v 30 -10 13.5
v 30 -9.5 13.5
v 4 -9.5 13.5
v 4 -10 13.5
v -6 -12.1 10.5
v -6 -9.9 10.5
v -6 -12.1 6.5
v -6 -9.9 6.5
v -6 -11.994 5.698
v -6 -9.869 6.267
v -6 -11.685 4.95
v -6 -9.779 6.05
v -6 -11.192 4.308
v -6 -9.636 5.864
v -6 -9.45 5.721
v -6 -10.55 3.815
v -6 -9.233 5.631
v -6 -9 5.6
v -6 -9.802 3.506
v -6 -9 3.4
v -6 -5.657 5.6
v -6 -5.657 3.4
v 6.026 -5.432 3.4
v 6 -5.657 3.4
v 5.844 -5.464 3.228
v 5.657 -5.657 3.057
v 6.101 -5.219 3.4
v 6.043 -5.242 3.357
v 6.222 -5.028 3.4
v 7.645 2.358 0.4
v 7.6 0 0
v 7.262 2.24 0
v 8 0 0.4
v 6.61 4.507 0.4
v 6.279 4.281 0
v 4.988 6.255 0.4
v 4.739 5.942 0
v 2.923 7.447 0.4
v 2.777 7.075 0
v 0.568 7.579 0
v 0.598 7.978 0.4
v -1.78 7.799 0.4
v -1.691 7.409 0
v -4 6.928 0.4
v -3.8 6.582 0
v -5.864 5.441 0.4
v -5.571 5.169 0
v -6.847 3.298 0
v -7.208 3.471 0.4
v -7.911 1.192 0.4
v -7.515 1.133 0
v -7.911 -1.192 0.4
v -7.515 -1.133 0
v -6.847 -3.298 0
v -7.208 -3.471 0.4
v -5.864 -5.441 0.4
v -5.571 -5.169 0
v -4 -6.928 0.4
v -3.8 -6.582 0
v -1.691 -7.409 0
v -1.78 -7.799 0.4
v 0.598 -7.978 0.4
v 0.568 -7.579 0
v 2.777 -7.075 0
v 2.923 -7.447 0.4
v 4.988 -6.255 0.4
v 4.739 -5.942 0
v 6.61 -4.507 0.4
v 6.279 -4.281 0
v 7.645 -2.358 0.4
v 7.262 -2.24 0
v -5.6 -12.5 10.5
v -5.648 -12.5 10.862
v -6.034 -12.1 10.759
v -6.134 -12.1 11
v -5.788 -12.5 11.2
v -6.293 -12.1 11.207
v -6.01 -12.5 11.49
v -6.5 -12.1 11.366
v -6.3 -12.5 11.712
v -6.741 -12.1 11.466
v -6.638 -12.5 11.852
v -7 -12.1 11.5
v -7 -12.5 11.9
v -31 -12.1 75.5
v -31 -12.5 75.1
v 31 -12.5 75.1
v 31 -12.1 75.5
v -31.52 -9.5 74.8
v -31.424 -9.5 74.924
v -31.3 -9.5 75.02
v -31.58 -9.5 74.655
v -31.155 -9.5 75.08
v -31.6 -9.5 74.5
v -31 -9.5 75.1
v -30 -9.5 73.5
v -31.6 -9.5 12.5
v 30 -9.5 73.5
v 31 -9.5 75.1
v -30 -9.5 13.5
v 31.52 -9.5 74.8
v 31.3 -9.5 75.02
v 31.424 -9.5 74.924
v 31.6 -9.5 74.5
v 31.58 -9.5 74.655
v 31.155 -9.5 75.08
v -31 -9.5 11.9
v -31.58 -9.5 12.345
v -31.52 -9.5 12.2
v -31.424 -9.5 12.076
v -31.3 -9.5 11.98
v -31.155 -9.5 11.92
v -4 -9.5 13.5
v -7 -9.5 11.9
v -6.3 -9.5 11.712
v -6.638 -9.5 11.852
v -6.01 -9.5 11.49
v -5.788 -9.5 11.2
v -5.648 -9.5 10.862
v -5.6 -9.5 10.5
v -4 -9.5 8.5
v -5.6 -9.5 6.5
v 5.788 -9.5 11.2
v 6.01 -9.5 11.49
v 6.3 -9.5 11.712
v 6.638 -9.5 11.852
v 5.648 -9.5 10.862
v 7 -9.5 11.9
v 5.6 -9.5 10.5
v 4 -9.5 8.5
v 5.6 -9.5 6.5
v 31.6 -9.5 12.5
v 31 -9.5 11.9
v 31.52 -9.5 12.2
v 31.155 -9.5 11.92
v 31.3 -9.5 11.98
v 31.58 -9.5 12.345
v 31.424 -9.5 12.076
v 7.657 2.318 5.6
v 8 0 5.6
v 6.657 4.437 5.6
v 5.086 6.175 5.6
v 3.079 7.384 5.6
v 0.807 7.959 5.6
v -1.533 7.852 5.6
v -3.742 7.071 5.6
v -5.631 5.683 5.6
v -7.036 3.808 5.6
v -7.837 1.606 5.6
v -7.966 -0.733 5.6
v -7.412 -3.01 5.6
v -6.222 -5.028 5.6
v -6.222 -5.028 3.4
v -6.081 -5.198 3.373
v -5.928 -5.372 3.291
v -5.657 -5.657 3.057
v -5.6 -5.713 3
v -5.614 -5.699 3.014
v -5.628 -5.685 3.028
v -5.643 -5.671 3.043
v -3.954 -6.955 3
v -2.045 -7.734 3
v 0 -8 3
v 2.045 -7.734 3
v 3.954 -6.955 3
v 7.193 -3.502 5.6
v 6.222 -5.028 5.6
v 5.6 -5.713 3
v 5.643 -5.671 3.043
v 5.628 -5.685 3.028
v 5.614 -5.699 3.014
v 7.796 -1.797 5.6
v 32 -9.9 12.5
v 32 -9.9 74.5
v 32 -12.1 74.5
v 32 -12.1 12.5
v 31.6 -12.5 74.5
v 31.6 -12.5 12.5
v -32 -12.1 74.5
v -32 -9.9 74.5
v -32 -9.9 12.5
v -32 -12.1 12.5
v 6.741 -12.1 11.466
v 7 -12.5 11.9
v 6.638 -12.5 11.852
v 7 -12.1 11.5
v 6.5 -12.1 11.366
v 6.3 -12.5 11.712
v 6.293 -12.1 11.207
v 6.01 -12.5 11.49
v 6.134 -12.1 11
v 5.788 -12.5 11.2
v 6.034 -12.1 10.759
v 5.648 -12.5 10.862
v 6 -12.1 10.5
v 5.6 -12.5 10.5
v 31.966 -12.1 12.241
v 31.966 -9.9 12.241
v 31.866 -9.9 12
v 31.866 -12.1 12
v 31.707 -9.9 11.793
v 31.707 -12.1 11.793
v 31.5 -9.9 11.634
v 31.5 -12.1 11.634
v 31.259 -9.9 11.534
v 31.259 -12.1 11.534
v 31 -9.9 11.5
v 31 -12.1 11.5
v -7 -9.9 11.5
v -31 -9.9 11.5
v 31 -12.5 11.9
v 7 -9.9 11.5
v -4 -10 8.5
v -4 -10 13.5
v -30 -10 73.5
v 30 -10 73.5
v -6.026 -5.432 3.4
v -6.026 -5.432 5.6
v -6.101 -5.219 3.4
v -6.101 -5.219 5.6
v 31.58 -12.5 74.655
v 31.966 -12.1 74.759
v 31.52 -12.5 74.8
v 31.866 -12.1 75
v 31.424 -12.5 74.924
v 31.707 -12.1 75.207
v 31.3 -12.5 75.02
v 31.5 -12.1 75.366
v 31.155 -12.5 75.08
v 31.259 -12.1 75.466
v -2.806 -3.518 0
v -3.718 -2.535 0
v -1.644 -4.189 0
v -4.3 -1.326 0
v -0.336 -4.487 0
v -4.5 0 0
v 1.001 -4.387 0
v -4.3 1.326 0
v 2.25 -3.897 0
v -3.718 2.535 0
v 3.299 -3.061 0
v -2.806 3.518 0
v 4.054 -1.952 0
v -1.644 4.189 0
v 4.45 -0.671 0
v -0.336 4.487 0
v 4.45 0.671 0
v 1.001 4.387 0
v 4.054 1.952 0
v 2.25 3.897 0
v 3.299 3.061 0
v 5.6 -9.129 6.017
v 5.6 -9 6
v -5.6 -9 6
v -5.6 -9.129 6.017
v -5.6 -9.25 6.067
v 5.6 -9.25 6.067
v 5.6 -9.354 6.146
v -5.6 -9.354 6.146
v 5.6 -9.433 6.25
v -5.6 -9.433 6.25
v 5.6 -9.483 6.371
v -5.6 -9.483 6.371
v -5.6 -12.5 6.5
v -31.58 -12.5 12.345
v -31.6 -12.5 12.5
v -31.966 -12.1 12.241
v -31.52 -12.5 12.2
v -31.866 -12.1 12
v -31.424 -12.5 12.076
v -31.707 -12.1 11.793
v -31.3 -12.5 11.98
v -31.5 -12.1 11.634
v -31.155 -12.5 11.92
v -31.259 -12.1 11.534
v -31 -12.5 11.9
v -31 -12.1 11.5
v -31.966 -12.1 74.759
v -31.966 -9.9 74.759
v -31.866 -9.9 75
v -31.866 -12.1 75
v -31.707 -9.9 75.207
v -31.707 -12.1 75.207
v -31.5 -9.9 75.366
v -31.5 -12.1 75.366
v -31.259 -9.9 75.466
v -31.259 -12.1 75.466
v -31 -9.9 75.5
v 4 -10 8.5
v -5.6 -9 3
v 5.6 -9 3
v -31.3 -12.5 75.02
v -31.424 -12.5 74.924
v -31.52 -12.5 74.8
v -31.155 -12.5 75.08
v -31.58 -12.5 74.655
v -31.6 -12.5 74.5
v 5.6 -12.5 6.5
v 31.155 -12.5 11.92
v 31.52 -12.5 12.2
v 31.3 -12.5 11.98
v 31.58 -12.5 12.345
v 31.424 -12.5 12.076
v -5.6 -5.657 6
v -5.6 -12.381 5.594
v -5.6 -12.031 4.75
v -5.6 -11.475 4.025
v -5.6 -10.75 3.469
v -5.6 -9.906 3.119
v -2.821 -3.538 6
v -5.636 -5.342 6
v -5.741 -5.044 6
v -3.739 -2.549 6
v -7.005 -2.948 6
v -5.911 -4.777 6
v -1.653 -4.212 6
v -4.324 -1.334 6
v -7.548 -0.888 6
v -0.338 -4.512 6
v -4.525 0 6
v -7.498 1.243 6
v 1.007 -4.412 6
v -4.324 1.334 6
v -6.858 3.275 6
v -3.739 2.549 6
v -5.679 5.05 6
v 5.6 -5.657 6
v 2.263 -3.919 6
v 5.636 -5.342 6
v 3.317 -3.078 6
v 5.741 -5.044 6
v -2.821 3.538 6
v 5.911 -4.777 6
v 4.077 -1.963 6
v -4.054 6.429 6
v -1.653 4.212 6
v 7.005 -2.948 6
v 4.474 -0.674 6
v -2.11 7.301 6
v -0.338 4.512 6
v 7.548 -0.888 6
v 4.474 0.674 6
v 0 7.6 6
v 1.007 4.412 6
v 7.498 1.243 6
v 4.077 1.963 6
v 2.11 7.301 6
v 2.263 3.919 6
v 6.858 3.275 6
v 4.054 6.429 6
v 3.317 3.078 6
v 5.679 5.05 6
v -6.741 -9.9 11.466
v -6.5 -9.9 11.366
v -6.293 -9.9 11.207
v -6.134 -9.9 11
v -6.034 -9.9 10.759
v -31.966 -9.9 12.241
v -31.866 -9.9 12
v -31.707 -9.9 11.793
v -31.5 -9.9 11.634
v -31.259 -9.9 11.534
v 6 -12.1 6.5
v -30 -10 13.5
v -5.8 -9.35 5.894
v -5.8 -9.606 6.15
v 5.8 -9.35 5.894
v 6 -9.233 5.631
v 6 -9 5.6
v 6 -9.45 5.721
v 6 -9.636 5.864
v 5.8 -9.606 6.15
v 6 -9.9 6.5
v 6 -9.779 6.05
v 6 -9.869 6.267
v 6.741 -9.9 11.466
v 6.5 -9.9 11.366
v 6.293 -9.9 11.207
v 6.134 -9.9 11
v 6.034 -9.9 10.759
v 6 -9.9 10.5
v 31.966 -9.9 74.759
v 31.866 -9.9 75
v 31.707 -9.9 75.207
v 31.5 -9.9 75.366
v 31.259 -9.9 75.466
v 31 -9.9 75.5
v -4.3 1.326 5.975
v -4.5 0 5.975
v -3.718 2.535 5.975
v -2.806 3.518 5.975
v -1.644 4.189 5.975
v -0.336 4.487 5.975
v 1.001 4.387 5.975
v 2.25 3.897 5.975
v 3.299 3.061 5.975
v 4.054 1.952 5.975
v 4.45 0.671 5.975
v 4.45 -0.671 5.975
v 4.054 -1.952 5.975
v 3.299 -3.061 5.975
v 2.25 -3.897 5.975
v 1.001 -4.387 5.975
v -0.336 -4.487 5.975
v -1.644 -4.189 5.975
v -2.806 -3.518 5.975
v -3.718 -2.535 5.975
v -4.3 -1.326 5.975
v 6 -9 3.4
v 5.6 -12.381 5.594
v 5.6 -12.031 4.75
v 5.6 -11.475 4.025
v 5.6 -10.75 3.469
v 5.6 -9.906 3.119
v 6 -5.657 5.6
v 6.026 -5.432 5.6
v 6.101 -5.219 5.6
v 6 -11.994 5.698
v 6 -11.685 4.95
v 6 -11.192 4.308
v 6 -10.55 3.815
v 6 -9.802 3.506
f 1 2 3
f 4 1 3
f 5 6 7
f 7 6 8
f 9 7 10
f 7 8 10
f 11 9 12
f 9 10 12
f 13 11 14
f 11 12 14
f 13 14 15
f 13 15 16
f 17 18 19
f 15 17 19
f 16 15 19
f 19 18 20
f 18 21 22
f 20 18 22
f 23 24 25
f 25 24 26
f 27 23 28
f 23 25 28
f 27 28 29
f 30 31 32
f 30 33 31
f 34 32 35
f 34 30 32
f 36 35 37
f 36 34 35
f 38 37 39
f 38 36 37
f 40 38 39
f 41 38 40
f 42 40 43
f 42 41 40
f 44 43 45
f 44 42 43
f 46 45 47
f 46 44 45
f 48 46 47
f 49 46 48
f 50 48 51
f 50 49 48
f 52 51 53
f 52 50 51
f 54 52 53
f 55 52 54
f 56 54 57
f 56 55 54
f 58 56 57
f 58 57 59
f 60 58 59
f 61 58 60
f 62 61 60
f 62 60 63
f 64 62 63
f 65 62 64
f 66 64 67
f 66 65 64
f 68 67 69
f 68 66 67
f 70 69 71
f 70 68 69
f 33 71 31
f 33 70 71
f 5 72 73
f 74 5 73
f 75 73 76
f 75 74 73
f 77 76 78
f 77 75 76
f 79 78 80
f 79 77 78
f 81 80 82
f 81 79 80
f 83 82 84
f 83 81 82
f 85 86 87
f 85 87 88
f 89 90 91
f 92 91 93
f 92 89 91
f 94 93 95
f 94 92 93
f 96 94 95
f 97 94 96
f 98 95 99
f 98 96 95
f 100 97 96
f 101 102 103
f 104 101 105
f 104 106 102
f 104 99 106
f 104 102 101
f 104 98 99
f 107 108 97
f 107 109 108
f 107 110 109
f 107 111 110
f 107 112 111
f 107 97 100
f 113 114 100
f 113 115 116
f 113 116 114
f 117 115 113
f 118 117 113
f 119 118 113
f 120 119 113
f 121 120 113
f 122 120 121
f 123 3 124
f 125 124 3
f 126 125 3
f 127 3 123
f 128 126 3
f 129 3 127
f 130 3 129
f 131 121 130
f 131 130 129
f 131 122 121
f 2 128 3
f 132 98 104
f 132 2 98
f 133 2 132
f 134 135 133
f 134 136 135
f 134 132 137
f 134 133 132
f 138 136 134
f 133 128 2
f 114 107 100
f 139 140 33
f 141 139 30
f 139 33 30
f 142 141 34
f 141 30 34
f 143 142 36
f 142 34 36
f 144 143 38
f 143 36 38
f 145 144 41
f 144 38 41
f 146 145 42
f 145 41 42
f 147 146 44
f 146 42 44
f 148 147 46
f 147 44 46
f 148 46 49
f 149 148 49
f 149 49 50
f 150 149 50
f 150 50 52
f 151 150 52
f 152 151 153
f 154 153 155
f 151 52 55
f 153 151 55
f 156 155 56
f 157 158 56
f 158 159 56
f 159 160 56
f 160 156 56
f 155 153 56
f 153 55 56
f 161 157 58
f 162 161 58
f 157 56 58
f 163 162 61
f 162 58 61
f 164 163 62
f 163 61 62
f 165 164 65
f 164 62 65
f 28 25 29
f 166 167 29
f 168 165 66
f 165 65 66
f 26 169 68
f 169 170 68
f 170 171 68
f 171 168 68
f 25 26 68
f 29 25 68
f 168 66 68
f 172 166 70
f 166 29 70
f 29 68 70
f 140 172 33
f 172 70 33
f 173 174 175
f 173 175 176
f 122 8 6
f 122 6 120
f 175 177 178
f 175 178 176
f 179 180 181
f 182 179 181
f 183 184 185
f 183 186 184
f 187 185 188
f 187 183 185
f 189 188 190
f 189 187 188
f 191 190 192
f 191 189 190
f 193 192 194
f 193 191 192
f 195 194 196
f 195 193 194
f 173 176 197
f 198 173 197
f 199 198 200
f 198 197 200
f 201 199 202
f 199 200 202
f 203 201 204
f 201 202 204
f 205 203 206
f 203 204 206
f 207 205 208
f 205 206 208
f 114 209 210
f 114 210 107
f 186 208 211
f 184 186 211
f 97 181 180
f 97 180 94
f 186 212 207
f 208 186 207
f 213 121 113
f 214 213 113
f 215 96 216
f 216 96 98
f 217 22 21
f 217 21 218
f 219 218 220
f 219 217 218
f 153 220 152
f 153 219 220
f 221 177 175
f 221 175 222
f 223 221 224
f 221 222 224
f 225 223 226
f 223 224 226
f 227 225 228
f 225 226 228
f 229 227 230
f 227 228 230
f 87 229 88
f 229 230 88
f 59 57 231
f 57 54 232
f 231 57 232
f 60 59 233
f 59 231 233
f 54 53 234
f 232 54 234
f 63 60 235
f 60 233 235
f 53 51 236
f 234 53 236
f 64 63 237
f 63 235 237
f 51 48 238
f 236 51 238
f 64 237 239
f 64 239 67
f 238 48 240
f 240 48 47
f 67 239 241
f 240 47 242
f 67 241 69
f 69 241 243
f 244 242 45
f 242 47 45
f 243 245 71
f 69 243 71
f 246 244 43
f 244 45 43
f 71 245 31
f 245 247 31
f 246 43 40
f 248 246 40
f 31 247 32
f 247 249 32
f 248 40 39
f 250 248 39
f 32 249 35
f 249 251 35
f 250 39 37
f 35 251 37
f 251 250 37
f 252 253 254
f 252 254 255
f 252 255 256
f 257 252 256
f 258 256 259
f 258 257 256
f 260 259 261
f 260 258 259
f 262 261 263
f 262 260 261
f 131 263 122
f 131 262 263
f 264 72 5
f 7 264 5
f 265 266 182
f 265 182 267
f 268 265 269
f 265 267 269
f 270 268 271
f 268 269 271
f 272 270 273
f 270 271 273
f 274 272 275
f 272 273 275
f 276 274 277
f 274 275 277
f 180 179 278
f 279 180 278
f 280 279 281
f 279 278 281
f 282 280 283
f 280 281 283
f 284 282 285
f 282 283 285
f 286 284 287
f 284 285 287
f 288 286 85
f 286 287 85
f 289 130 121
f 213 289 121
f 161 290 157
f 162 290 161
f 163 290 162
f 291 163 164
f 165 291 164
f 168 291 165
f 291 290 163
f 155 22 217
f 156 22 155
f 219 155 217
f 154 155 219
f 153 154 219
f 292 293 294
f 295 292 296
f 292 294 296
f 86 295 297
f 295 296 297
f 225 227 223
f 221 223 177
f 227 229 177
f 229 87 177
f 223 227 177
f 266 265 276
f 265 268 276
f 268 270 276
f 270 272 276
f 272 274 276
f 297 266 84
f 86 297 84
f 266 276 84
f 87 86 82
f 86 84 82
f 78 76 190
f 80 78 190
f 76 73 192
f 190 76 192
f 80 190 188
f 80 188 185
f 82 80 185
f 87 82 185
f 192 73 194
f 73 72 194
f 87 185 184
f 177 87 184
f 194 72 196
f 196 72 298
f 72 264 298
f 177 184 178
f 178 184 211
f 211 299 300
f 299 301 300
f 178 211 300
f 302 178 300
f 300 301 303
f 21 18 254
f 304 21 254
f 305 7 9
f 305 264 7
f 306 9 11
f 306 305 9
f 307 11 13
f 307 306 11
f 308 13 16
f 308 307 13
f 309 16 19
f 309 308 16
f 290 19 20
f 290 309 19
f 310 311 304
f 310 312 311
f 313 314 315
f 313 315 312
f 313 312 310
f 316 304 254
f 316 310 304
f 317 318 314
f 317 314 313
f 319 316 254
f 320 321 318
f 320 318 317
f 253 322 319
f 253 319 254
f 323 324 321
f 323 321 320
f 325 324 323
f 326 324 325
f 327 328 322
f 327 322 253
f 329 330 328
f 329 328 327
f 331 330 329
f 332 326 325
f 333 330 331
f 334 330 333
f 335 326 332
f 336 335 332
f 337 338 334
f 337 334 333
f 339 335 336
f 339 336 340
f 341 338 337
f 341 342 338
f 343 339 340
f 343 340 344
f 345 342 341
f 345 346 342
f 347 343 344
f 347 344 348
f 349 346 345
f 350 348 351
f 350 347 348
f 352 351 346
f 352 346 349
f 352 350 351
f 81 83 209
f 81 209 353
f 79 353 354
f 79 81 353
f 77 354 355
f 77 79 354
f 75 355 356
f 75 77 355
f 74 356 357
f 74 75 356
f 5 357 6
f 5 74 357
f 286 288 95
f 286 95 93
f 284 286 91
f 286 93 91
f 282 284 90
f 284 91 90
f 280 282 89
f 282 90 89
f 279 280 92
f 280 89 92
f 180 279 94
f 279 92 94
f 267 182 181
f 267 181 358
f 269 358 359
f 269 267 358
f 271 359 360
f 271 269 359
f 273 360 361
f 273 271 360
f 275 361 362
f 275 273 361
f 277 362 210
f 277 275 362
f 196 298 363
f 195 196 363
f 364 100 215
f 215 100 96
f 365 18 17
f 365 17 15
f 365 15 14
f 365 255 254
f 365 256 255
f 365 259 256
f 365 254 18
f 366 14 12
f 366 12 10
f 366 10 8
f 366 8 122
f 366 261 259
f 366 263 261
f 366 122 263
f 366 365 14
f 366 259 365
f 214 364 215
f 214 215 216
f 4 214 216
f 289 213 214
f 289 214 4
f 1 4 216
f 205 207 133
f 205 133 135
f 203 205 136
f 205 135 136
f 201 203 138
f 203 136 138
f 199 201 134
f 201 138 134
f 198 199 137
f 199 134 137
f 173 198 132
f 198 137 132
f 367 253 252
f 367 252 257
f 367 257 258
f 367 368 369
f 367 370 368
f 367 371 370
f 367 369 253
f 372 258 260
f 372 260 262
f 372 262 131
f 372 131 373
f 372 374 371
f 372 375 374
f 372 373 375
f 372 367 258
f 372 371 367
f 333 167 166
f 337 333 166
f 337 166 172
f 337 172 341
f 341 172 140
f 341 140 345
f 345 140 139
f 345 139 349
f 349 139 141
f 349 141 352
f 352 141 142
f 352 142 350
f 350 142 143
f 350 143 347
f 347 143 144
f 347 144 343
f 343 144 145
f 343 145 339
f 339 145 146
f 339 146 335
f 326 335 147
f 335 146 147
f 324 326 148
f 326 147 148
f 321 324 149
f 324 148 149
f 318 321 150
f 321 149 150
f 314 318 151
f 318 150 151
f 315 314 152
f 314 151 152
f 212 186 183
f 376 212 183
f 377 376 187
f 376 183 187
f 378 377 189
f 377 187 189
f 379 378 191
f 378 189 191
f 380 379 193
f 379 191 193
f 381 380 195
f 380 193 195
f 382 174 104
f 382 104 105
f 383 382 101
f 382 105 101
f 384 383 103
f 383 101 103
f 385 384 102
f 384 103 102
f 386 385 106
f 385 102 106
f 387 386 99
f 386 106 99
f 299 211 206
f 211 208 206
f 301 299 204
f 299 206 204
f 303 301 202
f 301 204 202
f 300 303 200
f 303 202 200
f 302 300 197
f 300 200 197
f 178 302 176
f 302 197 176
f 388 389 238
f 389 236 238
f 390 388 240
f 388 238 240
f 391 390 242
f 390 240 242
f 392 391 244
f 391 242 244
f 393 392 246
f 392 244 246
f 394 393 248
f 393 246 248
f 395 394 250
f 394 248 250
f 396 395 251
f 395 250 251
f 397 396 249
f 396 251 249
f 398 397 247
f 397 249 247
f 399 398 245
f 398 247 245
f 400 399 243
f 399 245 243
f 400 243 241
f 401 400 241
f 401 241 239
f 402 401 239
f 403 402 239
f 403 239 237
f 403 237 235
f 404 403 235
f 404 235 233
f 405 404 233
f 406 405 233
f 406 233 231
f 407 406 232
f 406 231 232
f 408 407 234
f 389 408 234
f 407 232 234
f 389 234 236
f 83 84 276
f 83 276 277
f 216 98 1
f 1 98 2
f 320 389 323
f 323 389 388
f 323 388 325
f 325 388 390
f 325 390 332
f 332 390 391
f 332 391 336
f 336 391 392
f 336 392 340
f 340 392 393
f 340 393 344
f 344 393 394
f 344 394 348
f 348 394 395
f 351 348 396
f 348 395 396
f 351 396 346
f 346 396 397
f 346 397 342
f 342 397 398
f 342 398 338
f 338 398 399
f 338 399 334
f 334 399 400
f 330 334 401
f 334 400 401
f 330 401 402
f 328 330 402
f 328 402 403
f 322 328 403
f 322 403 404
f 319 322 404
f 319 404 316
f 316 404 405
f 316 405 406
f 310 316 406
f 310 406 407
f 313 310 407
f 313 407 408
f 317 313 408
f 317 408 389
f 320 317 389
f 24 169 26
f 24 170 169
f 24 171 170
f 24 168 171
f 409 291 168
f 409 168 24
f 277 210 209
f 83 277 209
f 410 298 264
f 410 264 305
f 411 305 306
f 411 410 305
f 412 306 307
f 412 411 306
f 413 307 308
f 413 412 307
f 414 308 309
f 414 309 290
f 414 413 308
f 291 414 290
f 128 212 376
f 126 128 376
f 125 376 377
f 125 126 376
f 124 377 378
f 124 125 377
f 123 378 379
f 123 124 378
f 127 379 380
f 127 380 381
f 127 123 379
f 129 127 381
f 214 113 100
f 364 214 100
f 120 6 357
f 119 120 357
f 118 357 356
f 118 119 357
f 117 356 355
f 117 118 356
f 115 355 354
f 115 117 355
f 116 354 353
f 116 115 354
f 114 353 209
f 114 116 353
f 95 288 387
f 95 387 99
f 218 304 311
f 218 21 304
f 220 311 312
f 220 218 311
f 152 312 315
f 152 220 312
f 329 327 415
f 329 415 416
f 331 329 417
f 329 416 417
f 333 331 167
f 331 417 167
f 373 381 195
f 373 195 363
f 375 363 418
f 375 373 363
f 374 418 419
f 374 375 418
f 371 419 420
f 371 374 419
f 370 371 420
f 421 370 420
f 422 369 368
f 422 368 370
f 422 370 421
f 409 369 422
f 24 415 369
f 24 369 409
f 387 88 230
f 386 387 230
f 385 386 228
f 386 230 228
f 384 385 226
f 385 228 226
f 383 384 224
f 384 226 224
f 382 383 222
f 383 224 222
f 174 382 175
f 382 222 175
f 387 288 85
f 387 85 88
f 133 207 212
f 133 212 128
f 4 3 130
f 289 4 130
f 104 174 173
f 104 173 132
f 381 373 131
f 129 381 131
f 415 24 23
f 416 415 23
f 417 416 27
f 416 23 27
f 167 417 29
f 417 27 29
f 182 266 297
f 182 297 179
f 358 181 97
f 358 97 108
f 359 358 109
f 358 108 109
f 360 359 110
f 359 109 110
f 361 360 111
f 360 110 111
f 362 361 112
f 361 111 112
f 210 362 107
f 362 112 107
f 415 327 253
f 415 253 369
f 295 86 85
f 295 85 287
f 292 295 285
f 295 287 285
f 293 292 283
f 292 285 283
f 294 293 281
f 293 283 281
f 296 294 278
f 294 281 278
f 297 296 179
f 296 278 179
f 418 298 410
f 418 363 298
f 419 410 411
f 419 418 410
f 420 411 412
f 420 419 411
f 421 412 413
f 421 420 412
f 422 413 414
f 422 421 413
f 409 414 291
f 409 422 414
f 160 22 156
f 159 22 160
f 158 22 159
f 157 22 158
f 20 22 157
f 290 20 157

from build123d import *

# Parameters (mm, degrees)
SKETCH1_R                      = 8
BOSS_EXTRUDE1_DEPTH            = 6
BOSS_EXTRUDE2_DEPTH            = 6
SKETCH5_W                      = 64
SKETCH5_H                      = 64
BOSS_EXTRUDE3_DEPTH            = 3
CUT_EXTRUDE1_DEPTH             = 0.5
FILLET2_R                      = 1
M8_CLEARANCE_HOLE1_D           = 9
M8_CLEARANCE_HOLE1_CSINK_D     = 9.05
M8_CLEARANCE_HOLE1_CSINK_ANGLE = 90
CHAMFER1_SIZE                  = 0.4


with BuildPart() as part:
    # Sketch1 → Boss-Extrude1 (new body)
    with BuildSketch(Plane.XY):
        Circle(SKETCH1_R)
    extrude(amount=BOSS_EXTRUDE1_DEPTH)

    # Sketch4 → Boss-Extrude2 (add, symmetric)
    with BuildSketch(Plane(origin=(0, 0, 0), x_dir=(0, 0, -1), z_dir=(1, 0, 0))):
        with BuildLine():
            Line((-6, -4.5), (-6, -9))
            ThreePointArc((-6, -9), (-6.146446609, -9.353553391), (-6.5, -9.5))
            Line((-6.5, -9.5), (-11.5, -9.5))
            Line((-11.5, -9.5), (-11.5, -12.5))
            Line((-11.5, -12.5), (-6.5, -12.5))
            ThreePointArc((-6.5, -12.5), (-4.025126266, -11.474873734), (-3, -9))
            Line((-3, -9), (-3, -4.5))
            Line((-3, -4.5), (-6, -4.5))
        make_face()
    extrude(amount=BOSS_EXTRUDE2_DEPTH, both=True)

    # Sketch5 → Boss-Extrude3 (add)
    with BuildSketch(Plane(origin=(0, -9.5, 0), x_dir=(1, 0, 0), z_dir=(0, 1, 0))):
        with Locations((0, -43.5)):
            Rectangle(SKETCH5_W, SKETCH5_H)
    extrude(amount=-BOSS_EXTRUDE3_DEPTH)

    # Sketch6 → Cut-Extrude1 (cut)
    with BuildSketch(Plane(origin=(0, -9.5, 0), x_dir=(1, 0, 0), z_dir=(0, 1, 0))):
        Polygon((-4, -8.5), (-4, -13.5), (-30, -13.5), (-30, -73.5), (30, -73.5), (30, -13.5), (4, -13.5), (4, -8.5), align=None)
    extrude(amount=-CUT_EXTRUDE1_DEPTH, mode=Mode.SUBTRACT)

    # Fillet2
    fillet2_edges = [part.edges().sort_by_distance(p)[0] for p in [
        (6, -11, 11.5),
        (-6, -11, 11.5),
        (-6, -5.291502622, 4.5),
        (32, -11, 11.5),
        (32, -11, 75.5),
        (-32, -11, 75.5),
        (-32, -11, 11.5),
        (6, -5.291502622, 4.5),
    ]]
    fillet(fillet2_edges, radius=FILLET2_R)

    # M8 Clearance Hole1 (through all)
    with Locations(Plane.XY.offset(6)):
        with Locations((0, 0)):
            CounterSinkHole(M8_CLEARANCE_HOLE1_D / 2, M8_CLEARANCE_HOLE1_CSINK_D / 2, counter_sink_angle=M8_CLEARANCE_HOLE1_CSINK_ANGLE)

    # Chamfer1
    # the kernel refuses this chamfer: 0.4 mm, written as the material it takes off along each edge
    with BuildSketch(Plane(origin=(6, -9.5, 6.5), x_dir=(0.027495876610587302, -0.9996219169112966, 0), z_dir=(0, 0, 1)), Plane(origin=(-6, -12.5, 10.5), x_dir=(0.9996219169112966, -0.027495876610587302, 0), z_dir=(0, 0, -1))) as chamfer1_piece_1:
        Polygon((CHAMFER1_SIZE * 0.999621916911, -CHAMFER1_SIZE * 0.0274958766106), (-CHAMFER1_SIZE * 0.0274958766106, -CHAMFER1_SIZE * 0.999621916911), (0, 0), align=None)
    extrude(amount=4, mode=Mode.SUBTRACT)
    with BuildSketch(Plane(origin=(6, -9, 6.5), x_dir=(0, -1, 0), z_dir=(0, 0, 1))) as chamfer1_piece_2:
        Polygon((3.5, -CHAMFER1_SIZE), (3.5 - CHAMFER1_SIZE, 0), (3.5, 0), align=None)
    revolve(axis=Axis((6, -9, 6.5), (1, 0, 0)), revolution_arc=90, mode=Mode.SUBTRACT)
    with BuildSketch(Plane(origin=(-6, -9, 6.5), x_dir=(0, 0, -1), z_dir=(0, 1, 0))) as chamfer1_piece_3:
        Polygon((0.5 + CHAMFER1_SIZE, 0), (0.5, -CHAMFER1_SIZE), (0.5, 0), align=None)
    revolve(axis=Axis((-6, -9, 6.5), (-1, 0, 0)), revolution_arc=90, mode=Mode.SUBTRACT)
    with BuildSketch(Plane(origin=(-6, -9.5, 6.5), x_dir=(-0.027495876610587302, -0.9996219169112966, 0), z_dir=(0, 0, 1)), Plane(origin=(6, -12.5, 10.5), x_dir=(-0.9996219169112966, -0.027495876610587302, 0), z_dir=(0, 0, -1))) as chamfer1_piece_4:
        Polygon((CHAMFER1_SIZE * 0.999621916911, CHAMFER1_SIZE * 0.0274958766106), (-CHAMFER1_SIZE * 0.0274958766106, CHAMFER1_SIZE * 0.999621916911), (0, 0), align=None)
    extrude(amount=4, mode=Mode.SUBTRACT)
    with BuildSketch(Plane(origin=(-6, -9, 6.5), x_dir=(0, -1, 0), z_dir=(0, 0, 1))) as chamfer1_piece_5:
        Polygon((3.5 - CHAMFER1_SIZE, 0), (3.5, CHAMFER1_SIZE), (3.5, 0), align=None)
    revolve(axis=Axis((-6, -9, 6.5), (1, 0, 0)), revolution_arc=90, mode=Mode.SUBTRACT)
    with BuildSketch(Plane(origin=(-6, -9, 3), x_dir=(-0.02749587661058736, 0, 0.9996219169112966), z_dir=(0, 1, 0))) as chamfer1_piece_6_section:
        Polygon((CHAMFER1_SIZE * 0.999621916911, CHAMFER1_SIZE * 0.0274958766106), (-CHAMFER1_SIZE * 0.0274958766106, CHAMFER1_SIZE * 0.999621916911), (0, 0), align=None)
    chamfer1_piece_6 = extrude(amount=3.343145751, mode=Mode.PRIVATE)
    chamfer1_piece_6 = chamfer1_piece_6 - Plane(origin=(0, 0, 3.170790462), x_dir=(1, 0, 0), z_dir=(0, 0, -1)) * Cylinder(8, 9, mode=Mode.PRIVATE)
    add(chamfer1_piece_6, mode=Mode.SUBTRACT)
    with BuildSketch(Plane(origin=(0, 0, 0), x_dir=(1, 0, 0), z_dir=(0, -1, 0))) as chamfer1_piece_7:
        Polygon((8 - CHAMFER1_SIZE, 0), (8, CHAMFER1_SIZE), (8, 0), align=None)
    revolve(axis=Axis((0, 0, 0), (0, 0, 1)), mode=Mode.SUBTRACT)
    with BuildSketch(Plane(origin=(0, 0, 6), x_dir=(1, 0, 0), z_dir=(0, -1, 0))) as chamfer1_piece_8:
        Polygon((8 - CHAMFER1_SIZE, 0), (8, -CHAMFER1_SIZE), (8, 0), align=None)
    revolve(axis=Axis((0, 0, 6), (0, 0, 1)), revolution_arc=218.942441269, mode=Mode.SUBTRACT)
    with BuildSketch(Plane(origin=(-6, -5.656854249, 6), x_dir=(-0.027495876610587302, 0, -0.9996219169112966), z_dir=(0, -1, 0)), Plane(origin=(6, -5.656854249, 6), x_dir=(-0.9996219169112966, 0, 0.027495876610587302), z_dir=(0, -1, 0))) as chamfer1_piece_9:
        Polygon((CHAMFER1_SIZE * 0.999621916911, CHAMFER1_SIZE * 0.0274958766106), (-CHAMFER1_SIZE * 0.0274958766106, CHAMFER1_SIZE * 0.999621916911), (0, 0), align=None)
    extrude(amount=3.343145751, mode=Mode.SUBTRACT)
    with BuildSketch(Plane(origin=(31, -9.5, 11.5), x_dir=(0, -0.9996219169112966, -0.027495876610587302), z_dir=(-1, 0, 0)), Plane(origin=(-7, -9.5, 11.5), x_dir=(0, -0.9996219169112966, -0.027495876610587302), z_dir=(-1, 0, 0)), Plane(origin=(-7, -12.5, 11.5), x_dir=(0, -0.027495876610587302, 0.9996219169112966), z_dir=(-1, 0, 0))) as chamfer1_piece_10:
        Polygon((CHAMFER1_SIZE * 0.999621916911, CHAMFER1_SIZE * 0.0274958766106), (-CHAMFER1_SIZE * 0.0274958766106, CHAMFER1_SIZE * 0.999621916911), (0, 0), align=None)
    extrude(amount=24, mode=Mode.SUBTRACT)
    with BuildSketch(Plane(origin=(31, -12.5, 11.5), x_dir=(0, 0.9996219169112966, -0.027495876610587302), z_dir=(-1, 0, 0))) as chamfer1_piece_11:
        Polygon((CHAMFER1_SIZE * 0.999621916911, -CHAMFER1_SIZE * 0.0274958766106), (-CHAMFER1_SIZE * 0.0274958766106, -CHAMFER1_SIZE * 0.999621916911), (0, 0), align=None)
    extrude(amount=24, mode=Mode.SUBTRACT)
    with BuildSketch(Plane(origin=(32, -12.5, 74.5), x_dir=(-0.9996219169112966, -0.02749587661058742, 0), z_dir=(0, 0, -1)), Plane(origin=(32, -9.5, 74.5), x_dir=(0.027495876610578673, -0.999621916911297, 0), z_dir=(0, 0, -1)), Plane(origin=(-32, -9.5, 12.5), x_dir=(-0.027495876610578673, -0.999621916911297, 0), z_dir=(0, 0, 1)), Plane(origin=(-31, -9.5, 75.5), x_dir=(0, -0.9996219169112964, 0.027495876610595927), z_dir=(1, 0, 0)), Plane(origin=(-31, -12.5, 75.5), x_dir=(0, -0.02749587661058671, -0.9996219169112966), z_dir=(1, 0, 0)), Plane(origin=(-32, -12.5, 12.5), x_dir=(0.9996219169112966, -0.02749587661058742, 0), z_dir=(0, 0, 1))) as chamfer1_piece_12:
        Polygon((CHAMFER1_SIZE * 0.999621916911, CHAMFER1_SIZE * 0.0274958766106), (-CHAMFER1_SIZE * 0.0274958766106, CHAMFER1_SIZE * 0.999621916911), (0, 0), align=None)
    extrude(amount=62, mode=Mode.SUBTRACT)
    with BuildSketch(Plane(origin=(-31, -9.5, 12.5), x_dir=(-1, 0, 0), z_dir=(0, 0, 1))) as chamfer1_piece_13:
        Polygon((1, CHAMFER1_SIZE), (1 - CHAMFER1_SIZE, 0), (1, 0), align=None)
    revolve(axis=Axis((-31, -9.5, 12.5), (0, -1, 0)), revolution_arc=90, mode=Mode.SUBTRACT)
    with BuildSketch(Plane(origin=(-31, -9.5, 74.5), x_dir=(0, 0, 1), z_dir=(1, 0, 0))) as chamfer1_piece_14:
        Polygon((1, CHAMFER1_SIZE), (1 - CHAMFER1_SIZE, 0), (1, 0), align=None)
    revolve(axis=Axis((-31, -9.5, 74.5), (0, -1, 0)), revolution_arc=90, mode=Mode.SUBTRACT)
    with BuildSketch(Plane(origin=(31, -9.5, 74.5), x_dir=(1, 0, 0), z_dir=(0, 0, -1))) as chamfer1_piece_15:
        Polygon((1, CHAMFER1_SIZE), (1 - CHAMFER1_SIZE, 0), (1, 0), align=None)
    revolve(axis=Axis((31, -9.5, 74.5), (0, -1, 0)), revolution_arc=90, mode=Mode.SUBTRACT)
    with BuildSketch(Plane(origin=(31, -9.5, 12.5), x_dir=(0, 0, -1), z_dir=(-1, 0, 0))) as chamfer1_piece_16:
        Polygon((1, CHAMFER1_SIZE), (1 - CHAMFER1_SIZE, 0), (1, 0), align=None)
    revolve(axis=Axis((31, -9.5, 12.5), (0, -1, 0)), revolution_arc=90, mode=Mode.SUBTRACT)
    with BuildSketch(Plane(origin=(-31, -12.5, 12.5), x_dir=(-1, 0, 0), z_dir=(0, 0, 1))) as chamfer1_piece_17:
        Polygon((1 - CHAMFER1_SIZE, 0), (1, -CHAMFER1_SIZE), (1, 0), align=None)
    revolve(axis=Axis((-31, -12.5, 12.5), (0, -1, 0)), revolution_arc=90, mode=Mode.SUBTRACT)
    with BuildSketch(Plane(origin=(-31, -12.5, 74.5), x_dir=(0, 0, 1), z_dir=(1, 0, 0))) as chamfer1_piece_18:
        Polygon((1 - CHAMFER1_SIZE, 0), (1, -CHAMFER1_SIZE), (1, 0), align=None)
    revolve(axis=Axis((-31, -12.5, 74.5), (0, -1, 0)), revolution_arc=90, mode=Mode.SUBTRACT)
    with BuildSketch(Plane(origin=(31, -12.5, 74.5), x_dir=(1, 0, 0), z_dir=(0, 0, -1))) as chamfer1_piece_19:
        Polygon((1 - CHAMFER1_SIZE, 0), (1, -CHAMFER1_SIZE), (1, 0), align=None)
    revolve(axis=Axis((31, -12.5, 74.5), (0, -1, 0)), revolution_arc=90, mode=Mode.SUBTRACT)
    with BuildSketch(Plane(origin=(6, -9, 3), x_dir=(-0.9996219169112968, 0, -0.027495876610586226), z_dir=(0, 1, 0))) as chamfer1_piece_20_section:
        Polygon((CHAMFER1_SIZE * 0.999621916911, CHAMFER1_SIZE * 0.0274958766106), (-CHAMFER1_SIZE * 0.0274958766106, CHAMFER1_SIZE * 0.999621916911), (0, 0), align=None)
    chamfer1_piece_20 = extrude(amount=3.343145751, mode=Mode.PRIVATE)
    chamfer1_piece_20 = chamfer1_piece_20 - Plane(origin=(0, 0, 3.119938156), x_dir=(1, 0, 0), z_dir=(0, 0, -1)) * Cylinder(8, 9, mode=Mode.PRIVATE)
    add(chamfer1_piece_20, mode=Mode.SUBTRACT)
    with BuildSketch(Plane(origin=(31, -12.5, 12.5), x_dir=(0, 0, -1), z_dir=(-1, 0, 0))) as chamfer1_piece_21:
        Polygon((1 - CHAMFER1_SIZE, 0), (1, -CHAMFER1_SIZE), (1, 0), align=None)
    revolve(axis=Axis((31, -12.5, 12.5), (0, -1, 0)), revolution_arc=90, mode=Mode.SUBTRACT)
    with BuildSketch(Plane(origin=(-7, -5.656854249, 6), x_dir=(1, 0, 0), z_dir=(0, -1, 0))) as chamfer1_piece_22:
        Polygon((1 + CHAMFER1_SIZE, 0), (1, -CHAMFER1_SIZE), (1, 0), align=None)
    revolve(axis=Axis((-7, -5.656854249, 6), (0, 0, 1)), revolution_arc=38.942441269, mode=Mode.SUBTRACT)
    with BuildSketch(Plane(origin=(-7, -5.656854249, 3), x_dir=(1, 0, 0), z_dir=(0, -1, 0))) as chamfer1_piece_23_section:
        Polygon((1, CHAMFER1_SIZE), (1 + CHAMFER1_SIZE, 0), (1, 0), align=None)
    chamfer1_piece_23 = revolve(axis=Axis((-7, -5.656854249, 3), (0, 0, 1)), revolution_arc=97.885505576, mode=Mode.PRIVATE)
    chamfer1_piece_23 = chamfer1_piece_23 - Plane(origin=(0, 0, 3.19057738), x_dir=(1, 0, 0), z_dir=(0, 0, -1)) * Cylinder(8, 6, mode=Mode.PRIVATE)
    add(chamfer1_piece_23, mode=Mode.SUBTRACT)
    with BuildSketch(Plane(origin=(7, -5.656854249, 6), x_dir=(-1, 0, 0), z_dir=(0, -1, 0))) as chamfer1_piece_24:
        Polygon((1 + CHAMFER1_SIZE, 0), (1, CHAMFER1_SIZE), (1, 0), align=None)
    revolve(axis=Axis((7, -5.656854249, 6), (0, 0, -1)), revolution_arc=38.942441269, mode=Mode.SUBTRACT)
    with BuildSketch(Plane(origin=(7, -5.656854249, 3), x_dir=(-1, 0, 0), z_dir=(0, -1, 0))) as chamfer1_piece_25_section:
        Polygon((1, -CHAMFER1_SIZE), (1 + CHAMFER1_SIZE, 0), (1, 0), align=None)
    chamfer1_piece_25 = revolve(axis=Axis((7, -5.656854249, 3), (0, 0, -1)), revolution_arc=97.885505576, mode=Mode.PRIVATE)
    chamfer1_piece_25 = chamfer1_piece_25 - Plane(origin=(0, 0, 3.190577372), x_dir=(1, 0, 0), z_dir=(0, 0, -1)) * Cylinder(8, 6, mode=Mode.PRIVATE)
    add(chamfer1_piece_25, mode=Mode.SUBTRACT)
    with BuildSketch(Plane(origin=(7, -12.5, 10.5), x_dir=(0, 0, 1), z_dir=(1, 0, 0))) as chamfer1_piece_26:
        Polygon((1 + CHAMFER1_SIZE, 0), (1, -CHAMFER1_SIZE), (1, 0), align=None)
    revolve(axis=Axis((7, -12.5, 10.5), (0, -1, 0)), revolution_arc=90, mode=Mode.SUBTRACT)
    with BuildSketch(Plane(origin=(7, -9.5, 10.5), x_dir=(0, 0, 1), z_dir=(1, 0, 0))) as chamfer1_piece_27:
        Polygon((1, CHAMFER1_SIZE), (1 + CHAMFER1_SIZE, 0), (1, 0), align=None)
    revolve(axis=Axis((7, -9.5, 10.5), (0, -1, 0)), revolution_arc=90, mode=Mode.SUBTRACT)
    with BuildSketch(Plane(origin=(-7, -12.5, 10.5), x_dir=(1, 0, 0), z_dir=(0, 0, -1))) as chamfer1_piece_28:
        Polygon((1 + CHAMFER1_SIZE, 0), (1, -CHAMFER1_SIZE), (1, 0), align=None)
    revolve(axis=Axis((-7, -12.5, 10.5), (0, -1, 0)), revolution_arc=90, mode=Mode.SUBTRACT)
    with BuildSketch(Plane(origin=(6, -9, 6.5), x_dir=(0, 0, -1), z_dir=(0, 1, 0))) as chamfer1_piece_29:
        Polygon((0.5, CHAMFER1_SIZE), (0.5 + CHAMFER1_SIZE, 0), (0.5, 0), align=None)
    revolve(axis=Axis((6, -9, 6.5), (-1, 0, 0)), revolution_arc=90, mode=Mode.SUBTRACT)
    with BuildSketch(Plane(origin=(-7, -9.5, 10.5), x_dir=(1, 0, 0), z_dir=(0, 0, -1))) as chamfer1_piece_30:
        Polygon((1, CHAMFER1_SIZE), (1 + CHAMFER1_SIZE, 0), (1, 0), align=None)
    revolve(axis=Axis((-7, -9.5, 10.5), (0, -1, 0)), revolution_arc=90, mode=Mode.SUBTRACT)
    with BuildSketch(Plane(origin=(0, 0, 6), x_dir=(0.7777777777777778, -0.628539361054709, 0), z_dir=(-0.628539361054709, -0.7777777777777778, 0))) as chamfer1_piece_31:
        Polygon((8 - CHAMFER1_SIZE, 0), (8, -CHAMFER1_SIZE), (8, 0), align=None)
    revolve(axis=Axis((0, 0, 6), (0, 0, 1)), revolution_arc=38.942441269, mode=Mode.SUBTRACT)


solid = part.part
